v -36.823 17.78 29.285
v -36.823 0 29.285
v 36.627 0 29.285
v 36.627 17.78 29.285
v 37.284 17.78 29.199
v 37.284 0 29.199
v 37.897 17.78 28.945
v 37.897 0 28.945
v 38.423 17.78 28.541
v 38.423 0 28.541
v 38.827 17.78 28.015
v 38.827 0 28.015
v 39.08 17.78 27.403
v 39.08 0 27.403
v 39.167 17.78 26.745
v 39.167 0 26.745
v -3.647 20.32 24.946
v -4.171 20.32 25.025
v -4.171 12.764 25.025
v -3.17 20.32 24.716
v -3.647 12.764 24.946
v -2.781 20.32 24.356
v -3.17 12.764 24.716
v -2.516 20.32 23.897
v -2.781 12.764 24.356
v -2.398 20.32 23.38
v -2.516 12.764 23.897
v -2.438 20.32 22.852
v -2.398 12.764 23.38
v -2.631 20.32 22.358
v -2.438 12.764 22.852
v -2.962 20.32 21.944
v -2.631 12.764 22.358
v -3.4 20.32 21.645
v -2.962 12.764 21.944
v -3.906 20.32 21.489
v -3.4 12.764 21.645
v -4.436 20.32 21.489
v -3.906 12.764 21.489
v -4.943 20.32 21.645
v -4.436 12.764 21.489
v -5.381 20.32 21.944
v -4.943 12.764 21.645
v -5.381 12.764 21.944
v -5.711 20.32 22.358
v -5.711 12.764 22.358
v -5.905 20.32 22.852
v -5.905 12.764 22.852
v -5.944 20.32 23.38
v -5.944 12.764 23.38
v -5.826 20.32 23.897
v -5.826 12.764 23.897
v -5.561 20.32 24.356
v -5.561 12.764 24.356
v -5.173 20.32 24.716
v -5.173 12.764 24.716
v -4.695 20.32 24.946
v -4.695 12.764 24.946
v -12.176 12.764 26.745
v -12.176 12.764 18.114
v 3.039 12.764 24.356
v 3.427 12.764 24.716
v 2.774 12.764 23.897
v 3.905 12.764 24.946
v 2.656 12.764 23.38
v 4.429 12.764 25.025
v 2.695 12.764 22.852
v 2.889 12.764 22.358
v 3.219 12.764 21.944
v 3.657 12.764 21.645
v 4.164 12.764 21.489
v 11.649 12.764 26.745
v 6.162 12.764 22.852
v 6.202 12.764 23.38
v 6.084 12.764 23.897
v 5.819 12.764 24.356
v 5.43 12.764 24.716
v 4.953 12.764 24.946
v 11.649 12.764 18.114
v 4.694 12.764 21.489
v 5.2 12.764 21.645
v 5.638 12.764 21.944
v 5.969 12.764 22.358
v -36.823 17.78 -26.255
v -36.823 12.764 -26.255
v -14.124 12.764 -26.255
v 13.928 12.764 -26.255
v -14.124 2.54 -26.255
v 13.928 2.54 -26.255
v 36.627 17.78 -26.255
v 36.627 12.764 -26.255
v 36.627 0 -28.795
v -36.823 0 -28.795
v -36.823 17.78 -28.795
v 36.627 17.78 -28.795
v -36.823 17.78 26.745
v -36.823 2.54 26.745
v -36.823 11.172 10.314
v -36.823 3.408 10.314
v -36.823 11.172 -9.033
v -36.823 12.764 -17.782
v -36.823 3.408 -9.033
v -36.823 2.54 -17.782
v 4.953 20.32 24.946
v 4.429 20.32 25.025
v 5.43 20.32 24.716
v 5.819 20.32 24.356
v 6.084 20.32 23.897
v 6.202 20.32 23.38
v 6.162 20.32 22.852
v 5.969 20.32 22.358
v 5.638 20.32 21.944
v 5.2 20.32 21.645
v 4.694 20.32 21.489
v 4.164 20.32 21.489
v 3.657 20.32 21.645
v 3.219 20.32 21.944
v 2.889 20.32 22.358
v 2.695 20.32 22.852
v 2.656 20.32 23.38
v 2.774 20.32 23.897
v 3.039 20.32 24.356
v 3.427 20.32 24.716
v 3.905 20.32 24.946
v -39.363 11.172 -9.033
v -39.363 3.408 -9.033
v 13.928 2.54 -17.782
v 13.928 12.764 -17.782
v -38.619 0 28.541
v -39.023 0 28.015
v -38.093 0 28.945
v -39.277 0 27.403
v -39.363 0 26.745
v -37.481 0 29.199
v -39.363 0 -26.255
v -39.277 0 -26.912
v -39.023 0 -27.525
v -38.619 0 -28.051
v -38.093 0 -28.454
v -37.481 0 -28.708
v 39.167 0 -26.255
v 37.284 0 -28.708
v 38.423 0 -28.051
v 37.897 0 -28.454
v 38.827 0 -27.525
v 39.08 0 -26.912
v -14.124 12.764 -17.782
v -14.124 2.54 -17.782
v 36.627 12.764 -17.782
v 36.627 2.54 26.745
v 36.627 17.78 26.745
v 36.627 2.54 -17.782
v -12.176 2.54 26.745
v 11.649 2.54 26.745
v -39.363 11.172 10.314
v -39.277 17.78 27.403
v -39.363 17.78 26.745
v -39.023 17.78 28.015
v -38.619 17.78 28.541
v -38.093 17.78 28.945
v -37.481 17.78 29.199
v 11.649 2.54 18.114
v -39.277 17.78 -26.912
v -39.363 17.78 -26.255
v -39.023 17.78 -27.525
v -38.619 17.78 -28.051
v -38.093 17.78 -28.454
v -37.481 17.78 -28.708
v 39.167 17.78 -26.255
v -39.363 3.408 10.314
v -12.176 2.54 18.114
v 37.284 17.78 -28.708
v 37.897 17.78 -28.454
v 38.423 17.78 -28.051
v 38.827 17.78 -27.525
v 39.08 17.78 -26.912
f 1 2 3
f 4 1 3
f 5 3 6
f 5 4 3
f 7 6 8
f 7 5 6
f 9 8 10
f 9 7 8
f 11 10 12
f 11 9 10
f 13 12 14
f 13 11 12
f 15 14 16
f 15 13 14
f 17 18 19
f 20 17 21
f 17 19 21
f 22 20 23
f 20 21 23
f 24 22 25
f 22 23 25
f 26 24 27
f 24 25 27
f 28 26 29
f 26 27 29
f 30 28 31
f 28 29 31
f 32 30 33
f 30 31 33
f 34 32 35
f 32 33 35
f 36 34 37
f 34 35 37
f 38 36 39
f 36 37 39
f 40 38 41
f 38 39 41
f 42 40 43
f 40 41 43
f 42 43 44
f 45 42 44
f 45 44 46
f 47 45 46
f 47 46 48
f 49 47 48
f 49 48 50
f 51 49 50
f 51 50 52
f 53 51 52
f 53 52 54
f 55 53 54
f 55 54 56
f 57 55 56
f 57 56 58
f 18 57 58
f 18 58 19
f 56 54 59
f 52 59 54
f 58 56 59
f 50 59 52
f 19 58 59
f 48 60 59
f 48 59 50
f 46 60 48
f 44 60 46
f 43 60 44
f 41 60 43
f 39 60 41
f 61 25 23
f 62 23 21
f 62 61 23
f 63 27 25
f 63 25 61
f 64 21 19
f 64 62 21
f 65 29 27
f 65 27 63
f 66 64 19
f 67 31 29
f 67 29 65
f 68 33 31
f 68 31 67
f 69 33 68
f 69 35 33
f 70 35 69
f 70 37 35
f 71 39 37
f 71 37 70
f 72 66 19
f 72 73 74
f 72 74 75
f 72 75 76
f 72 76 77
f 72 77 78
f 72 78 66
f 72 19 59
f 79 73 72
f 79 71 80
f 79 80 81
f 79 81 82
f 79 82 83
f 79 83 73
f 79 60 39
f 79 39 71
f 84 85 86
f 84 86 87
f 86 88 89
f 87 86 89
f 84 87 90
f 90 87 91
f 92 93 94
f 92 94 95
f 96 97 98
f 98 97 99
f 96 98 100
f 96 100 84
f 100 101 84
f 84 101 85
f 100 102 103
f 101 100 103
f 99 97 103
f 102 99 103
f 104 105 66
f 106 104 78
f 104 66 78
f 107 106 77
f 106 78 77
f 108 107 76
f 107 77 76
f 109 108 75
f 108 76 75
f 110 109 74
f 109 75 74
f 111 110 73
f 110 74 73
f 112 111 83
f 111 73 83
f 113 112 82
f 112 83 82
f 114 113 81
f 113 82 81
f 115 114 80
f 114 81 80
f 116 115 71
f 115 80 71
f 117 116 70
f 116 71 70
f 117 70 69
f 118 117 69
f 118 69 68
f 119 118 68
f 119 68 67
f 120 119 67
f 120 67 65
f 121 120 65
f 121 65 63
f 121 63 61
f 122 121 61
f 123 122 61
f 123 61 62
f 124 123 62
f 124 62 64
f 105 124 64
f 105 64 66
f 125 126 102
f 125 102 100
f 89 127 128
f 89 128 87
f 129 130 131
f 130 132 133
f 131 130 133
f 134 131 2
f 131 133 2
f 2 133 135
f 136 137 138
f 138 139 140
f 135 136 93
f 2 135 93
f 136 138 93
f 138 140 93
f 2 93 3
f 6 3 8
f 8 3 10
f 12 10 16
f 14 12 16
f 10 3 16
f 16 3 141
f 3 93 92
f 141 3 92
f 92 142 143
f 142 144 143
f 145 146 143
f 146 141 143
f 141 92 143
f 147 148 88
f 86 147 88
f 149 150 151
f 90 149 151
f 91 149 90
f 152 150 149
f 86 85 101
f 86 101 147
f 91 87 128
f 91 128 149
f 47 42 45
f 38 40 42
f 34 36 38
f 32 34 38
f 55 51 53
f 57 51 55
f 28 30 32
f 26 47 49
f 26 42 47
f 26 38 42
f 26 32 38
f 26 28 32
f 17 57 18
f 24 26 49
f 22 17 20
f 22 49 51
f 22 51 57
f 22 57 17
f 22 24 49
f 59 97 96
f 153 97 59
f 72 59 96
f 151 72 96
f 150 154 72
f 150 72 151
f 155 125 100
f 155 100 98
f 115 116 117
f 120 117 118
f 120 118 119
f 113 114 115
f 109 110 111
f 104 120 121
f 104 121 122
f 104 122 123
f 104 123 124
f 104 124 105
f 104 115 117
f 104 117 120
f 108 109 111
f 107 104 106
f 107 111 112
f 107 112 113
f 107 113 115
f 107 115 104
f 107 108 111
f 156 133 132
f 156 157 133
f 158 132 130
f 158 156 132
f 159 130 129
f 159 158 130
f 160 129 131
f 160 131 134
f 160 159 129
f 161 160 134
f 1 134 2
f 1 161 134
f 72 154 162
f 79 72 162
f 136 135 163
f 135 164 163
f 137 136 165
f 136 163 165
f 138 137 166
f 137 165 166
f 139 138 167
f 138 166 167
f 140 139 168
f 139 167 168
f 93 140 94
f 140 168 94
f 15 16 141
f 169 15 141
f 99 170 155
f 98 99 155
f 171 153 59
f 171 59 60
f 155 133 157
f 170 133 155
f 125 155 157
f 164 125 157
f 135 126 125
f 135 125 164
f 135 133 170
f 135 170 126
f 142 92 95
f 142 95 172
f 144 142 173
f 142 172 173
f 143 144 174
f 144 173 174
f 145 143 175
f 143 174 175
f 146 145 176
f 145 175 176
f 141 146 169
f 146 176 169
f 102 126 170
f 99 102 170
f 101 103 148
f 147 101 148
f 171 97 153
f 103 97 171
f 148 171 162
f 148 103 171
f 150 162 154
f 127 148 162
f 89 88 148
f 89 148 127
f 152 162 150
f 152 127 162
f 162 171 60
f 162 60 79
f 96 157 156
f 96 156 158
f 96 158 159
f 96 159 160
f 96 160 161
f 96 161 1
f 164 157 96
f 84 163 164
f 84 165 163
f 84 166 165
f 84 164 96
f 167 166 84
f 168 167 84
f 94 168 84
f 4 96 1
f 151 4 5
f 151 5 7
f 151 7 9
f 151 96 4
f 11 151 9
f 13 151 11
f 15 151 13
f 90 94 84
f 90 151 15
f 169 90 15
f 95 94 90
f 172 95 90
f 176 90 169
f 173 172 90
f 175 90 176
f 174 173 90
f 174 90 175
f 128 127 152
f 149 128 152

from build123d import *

# Parameters (mm, degrees)
BOSS_EXTRUDE5_DEPTH   = 2.54
SKETCH1_14_W          = 78.53
SKETCH1_14_H          = 58.08
SKETCH1_14_W_2        = 73.45
SKETCH1_14_H_2        = 53
BOSS_EXTRUDE6_DEPTH   = 17.78
SKETCH1_15_R          = 1.778
BOSS_EXTRUDE7_DEPTH   = 20.32
BOSS_EXTRUDE7_2_DEPTH = 20.32
SKETCH1_16_W          = 22.699017595
SKETCH1_16_H          = 8.472740405
SKETCH1_16_W_2        = 23.825224437
SKETCH1_16_H_2        = 8.631081672
SKETCH1_16_R          = 1.778
BOSS_EXTRUDE8_DEPTH   = 12.7635
SKETCH2_W             = 19.346850656
SKETCH2_H             = 7.764196645
CUT_EXTRUDE1_DEPTH    = 2.54
FILLET1_R             = 2.54


with BuildPart() as part:
    # Sketch1 → Boss-Extrude5 (new body)
    with BuildSketch(Plane(origin=(0, 0, 0), x_dir=(1, 0, 0), z_dir=(0, 1, 0))):
        Polygon((13.927874743, 17.78199044), (13.927874743, 26.254730845), (-14.124090067, 26.254730845), (-14.124090067, 17.78199044), (-36.823107662, 17.78199044), (-36.823107662, -26.745269155), (-12.176172828, -26.745269155), (-12.176172828, -18.114187483), (11.649051609, -18.114187483), (11.649051609, -26.745269155), (36.626892338, -26.745269155), (36.626892338, 17.78199044), align=None)
    extrude(amount=BOSS_EXTRUDE5_DEPTH)

    # Sketch1<14> → Boss-Extrude6 (add)
    with BuildSketch(Plane(origin=(0, 0, 0), x_dir=(1, 0, 0), z_dir=(0, 1, 0))):
        with Locations((-0.098107662, -0.245269155)):
            Rectangle(SKETCH1_14_W, SKETCH1_14_H)
        with Locations((-0.098107662, -0.245269155)):
            Rectangle(SKETCH1_14_W_2, SKETCH1_14_H_2, mode=Mode.SUBTRACT)
    extrude(amount=BOSS_EXTRUDE6_DEPTH)



with BuildPart() as body_2:
    # Sketch1<15> → Boss-Extrude7 (new body)
    with BuildSketch(Plane(origin=(0, 0, 0), x_dir=(1, 0, 0), z_dir=(0, 1, 0))):
        with Locations(Location((-4.171215324, -23.247161493, 0), (0, 0, 270))):
            Circle(SKETCH1_15_R)
    extrude(amount=BOSS_EXTRUDE7_DEPTH)


with BuildPart() as body_3:
    # Sketch1<15> → Boss-Extrude7 2 (new body)
    with BuildSketch(Plane(origin=(0, 0, 0), x_dir=(1, 0, 0), z_dir=(0, 1, 0))):
        with Locations(Location((4.428784676, -23.247161493, 0), (0, 0, 270))):
            Circle(SKETCH1_15_R)
    extrude(amount=BOSS_EXTRUDE7_2_DEPTH)


with BuildPart() as part_1:
    add(part.part)

    add(body_2.part)  # Boss-Extrude8 merges body 2

    add(body_3.part)  # Boss-Extrude8 merges body 3
    # Sketch1<16> → Boss-Extrude8 (add)
    # profile 1 of 3: a face of its own
    with BuildSketch(Plane(origin=(0, 0, 0), x_dir=(1, 0, 0), z_dir=(0, 1, 0))):
        with Locations((25.277383541, 22.018360642)):
            Rectangle(SKETCH1_16_W, SKETCH1_16_H)
    # profile 2 of 3: a face of its own
    with BuildSketch(Plane(origin=(0, 0, 0), x_dir=(1, 0, 0), z_dir=(0, 1, 0))):
        with Locations((-25.473598865, 22.018360642)):
            Rectangle(SKETCH1_16_W, SKETCH1_16_H)
    # profile 3 of 3: a face of its own
    with BuildSketch(Plane(origin=(0, 0, 0), x_dir=(1, 0, 0), z_dir=(0, 1, 0))):
        with Locations((-0.263560609, -22.429728319)):
            Rectangle(SKETCH1_16_W_2, SKETCH1_16_H_2)
        with Locations((-4.171215324, -23.247161493)):
            Circle(SKETCH1_16_R, mode=Mode.SUBTRACT)
        with Locations((4.428784676, -23.247161493)):
            Circle(SKETCH1_16_R, mode=Mode.SUBTRACT)
    extrude(amount=BOSS_EXTRUDE8_DEPTH)

    # Sketch2 → Cut-Extrude1 (cut)
    with BuildSketch(Plane.ZY.offset(39.363107662)):
        with Locations((0.640618985, 7.290284295)):
            Rectangle(SKETCH2_W, SKETCH2_H)
    extrude(amount=-CUT_EXTRUDE1_DEPTH, mode=Mode.SUBTRACT)

    # Fillet1
    fillet1_edges = [part_1.edges().sort_by_distance(p)[0] for p in [
        (-39.363107662, 8.89, 29.285269155),
        (39.166892338, 8.89, 29.285269155),
        (39.166892338, 8.89, -28.794730845),
        (-39.363107662, 8.89, -28.794730845),
    ]]
    fillet(fillet1_edges, radius=FILLET1_R)


solid = part_1.part
